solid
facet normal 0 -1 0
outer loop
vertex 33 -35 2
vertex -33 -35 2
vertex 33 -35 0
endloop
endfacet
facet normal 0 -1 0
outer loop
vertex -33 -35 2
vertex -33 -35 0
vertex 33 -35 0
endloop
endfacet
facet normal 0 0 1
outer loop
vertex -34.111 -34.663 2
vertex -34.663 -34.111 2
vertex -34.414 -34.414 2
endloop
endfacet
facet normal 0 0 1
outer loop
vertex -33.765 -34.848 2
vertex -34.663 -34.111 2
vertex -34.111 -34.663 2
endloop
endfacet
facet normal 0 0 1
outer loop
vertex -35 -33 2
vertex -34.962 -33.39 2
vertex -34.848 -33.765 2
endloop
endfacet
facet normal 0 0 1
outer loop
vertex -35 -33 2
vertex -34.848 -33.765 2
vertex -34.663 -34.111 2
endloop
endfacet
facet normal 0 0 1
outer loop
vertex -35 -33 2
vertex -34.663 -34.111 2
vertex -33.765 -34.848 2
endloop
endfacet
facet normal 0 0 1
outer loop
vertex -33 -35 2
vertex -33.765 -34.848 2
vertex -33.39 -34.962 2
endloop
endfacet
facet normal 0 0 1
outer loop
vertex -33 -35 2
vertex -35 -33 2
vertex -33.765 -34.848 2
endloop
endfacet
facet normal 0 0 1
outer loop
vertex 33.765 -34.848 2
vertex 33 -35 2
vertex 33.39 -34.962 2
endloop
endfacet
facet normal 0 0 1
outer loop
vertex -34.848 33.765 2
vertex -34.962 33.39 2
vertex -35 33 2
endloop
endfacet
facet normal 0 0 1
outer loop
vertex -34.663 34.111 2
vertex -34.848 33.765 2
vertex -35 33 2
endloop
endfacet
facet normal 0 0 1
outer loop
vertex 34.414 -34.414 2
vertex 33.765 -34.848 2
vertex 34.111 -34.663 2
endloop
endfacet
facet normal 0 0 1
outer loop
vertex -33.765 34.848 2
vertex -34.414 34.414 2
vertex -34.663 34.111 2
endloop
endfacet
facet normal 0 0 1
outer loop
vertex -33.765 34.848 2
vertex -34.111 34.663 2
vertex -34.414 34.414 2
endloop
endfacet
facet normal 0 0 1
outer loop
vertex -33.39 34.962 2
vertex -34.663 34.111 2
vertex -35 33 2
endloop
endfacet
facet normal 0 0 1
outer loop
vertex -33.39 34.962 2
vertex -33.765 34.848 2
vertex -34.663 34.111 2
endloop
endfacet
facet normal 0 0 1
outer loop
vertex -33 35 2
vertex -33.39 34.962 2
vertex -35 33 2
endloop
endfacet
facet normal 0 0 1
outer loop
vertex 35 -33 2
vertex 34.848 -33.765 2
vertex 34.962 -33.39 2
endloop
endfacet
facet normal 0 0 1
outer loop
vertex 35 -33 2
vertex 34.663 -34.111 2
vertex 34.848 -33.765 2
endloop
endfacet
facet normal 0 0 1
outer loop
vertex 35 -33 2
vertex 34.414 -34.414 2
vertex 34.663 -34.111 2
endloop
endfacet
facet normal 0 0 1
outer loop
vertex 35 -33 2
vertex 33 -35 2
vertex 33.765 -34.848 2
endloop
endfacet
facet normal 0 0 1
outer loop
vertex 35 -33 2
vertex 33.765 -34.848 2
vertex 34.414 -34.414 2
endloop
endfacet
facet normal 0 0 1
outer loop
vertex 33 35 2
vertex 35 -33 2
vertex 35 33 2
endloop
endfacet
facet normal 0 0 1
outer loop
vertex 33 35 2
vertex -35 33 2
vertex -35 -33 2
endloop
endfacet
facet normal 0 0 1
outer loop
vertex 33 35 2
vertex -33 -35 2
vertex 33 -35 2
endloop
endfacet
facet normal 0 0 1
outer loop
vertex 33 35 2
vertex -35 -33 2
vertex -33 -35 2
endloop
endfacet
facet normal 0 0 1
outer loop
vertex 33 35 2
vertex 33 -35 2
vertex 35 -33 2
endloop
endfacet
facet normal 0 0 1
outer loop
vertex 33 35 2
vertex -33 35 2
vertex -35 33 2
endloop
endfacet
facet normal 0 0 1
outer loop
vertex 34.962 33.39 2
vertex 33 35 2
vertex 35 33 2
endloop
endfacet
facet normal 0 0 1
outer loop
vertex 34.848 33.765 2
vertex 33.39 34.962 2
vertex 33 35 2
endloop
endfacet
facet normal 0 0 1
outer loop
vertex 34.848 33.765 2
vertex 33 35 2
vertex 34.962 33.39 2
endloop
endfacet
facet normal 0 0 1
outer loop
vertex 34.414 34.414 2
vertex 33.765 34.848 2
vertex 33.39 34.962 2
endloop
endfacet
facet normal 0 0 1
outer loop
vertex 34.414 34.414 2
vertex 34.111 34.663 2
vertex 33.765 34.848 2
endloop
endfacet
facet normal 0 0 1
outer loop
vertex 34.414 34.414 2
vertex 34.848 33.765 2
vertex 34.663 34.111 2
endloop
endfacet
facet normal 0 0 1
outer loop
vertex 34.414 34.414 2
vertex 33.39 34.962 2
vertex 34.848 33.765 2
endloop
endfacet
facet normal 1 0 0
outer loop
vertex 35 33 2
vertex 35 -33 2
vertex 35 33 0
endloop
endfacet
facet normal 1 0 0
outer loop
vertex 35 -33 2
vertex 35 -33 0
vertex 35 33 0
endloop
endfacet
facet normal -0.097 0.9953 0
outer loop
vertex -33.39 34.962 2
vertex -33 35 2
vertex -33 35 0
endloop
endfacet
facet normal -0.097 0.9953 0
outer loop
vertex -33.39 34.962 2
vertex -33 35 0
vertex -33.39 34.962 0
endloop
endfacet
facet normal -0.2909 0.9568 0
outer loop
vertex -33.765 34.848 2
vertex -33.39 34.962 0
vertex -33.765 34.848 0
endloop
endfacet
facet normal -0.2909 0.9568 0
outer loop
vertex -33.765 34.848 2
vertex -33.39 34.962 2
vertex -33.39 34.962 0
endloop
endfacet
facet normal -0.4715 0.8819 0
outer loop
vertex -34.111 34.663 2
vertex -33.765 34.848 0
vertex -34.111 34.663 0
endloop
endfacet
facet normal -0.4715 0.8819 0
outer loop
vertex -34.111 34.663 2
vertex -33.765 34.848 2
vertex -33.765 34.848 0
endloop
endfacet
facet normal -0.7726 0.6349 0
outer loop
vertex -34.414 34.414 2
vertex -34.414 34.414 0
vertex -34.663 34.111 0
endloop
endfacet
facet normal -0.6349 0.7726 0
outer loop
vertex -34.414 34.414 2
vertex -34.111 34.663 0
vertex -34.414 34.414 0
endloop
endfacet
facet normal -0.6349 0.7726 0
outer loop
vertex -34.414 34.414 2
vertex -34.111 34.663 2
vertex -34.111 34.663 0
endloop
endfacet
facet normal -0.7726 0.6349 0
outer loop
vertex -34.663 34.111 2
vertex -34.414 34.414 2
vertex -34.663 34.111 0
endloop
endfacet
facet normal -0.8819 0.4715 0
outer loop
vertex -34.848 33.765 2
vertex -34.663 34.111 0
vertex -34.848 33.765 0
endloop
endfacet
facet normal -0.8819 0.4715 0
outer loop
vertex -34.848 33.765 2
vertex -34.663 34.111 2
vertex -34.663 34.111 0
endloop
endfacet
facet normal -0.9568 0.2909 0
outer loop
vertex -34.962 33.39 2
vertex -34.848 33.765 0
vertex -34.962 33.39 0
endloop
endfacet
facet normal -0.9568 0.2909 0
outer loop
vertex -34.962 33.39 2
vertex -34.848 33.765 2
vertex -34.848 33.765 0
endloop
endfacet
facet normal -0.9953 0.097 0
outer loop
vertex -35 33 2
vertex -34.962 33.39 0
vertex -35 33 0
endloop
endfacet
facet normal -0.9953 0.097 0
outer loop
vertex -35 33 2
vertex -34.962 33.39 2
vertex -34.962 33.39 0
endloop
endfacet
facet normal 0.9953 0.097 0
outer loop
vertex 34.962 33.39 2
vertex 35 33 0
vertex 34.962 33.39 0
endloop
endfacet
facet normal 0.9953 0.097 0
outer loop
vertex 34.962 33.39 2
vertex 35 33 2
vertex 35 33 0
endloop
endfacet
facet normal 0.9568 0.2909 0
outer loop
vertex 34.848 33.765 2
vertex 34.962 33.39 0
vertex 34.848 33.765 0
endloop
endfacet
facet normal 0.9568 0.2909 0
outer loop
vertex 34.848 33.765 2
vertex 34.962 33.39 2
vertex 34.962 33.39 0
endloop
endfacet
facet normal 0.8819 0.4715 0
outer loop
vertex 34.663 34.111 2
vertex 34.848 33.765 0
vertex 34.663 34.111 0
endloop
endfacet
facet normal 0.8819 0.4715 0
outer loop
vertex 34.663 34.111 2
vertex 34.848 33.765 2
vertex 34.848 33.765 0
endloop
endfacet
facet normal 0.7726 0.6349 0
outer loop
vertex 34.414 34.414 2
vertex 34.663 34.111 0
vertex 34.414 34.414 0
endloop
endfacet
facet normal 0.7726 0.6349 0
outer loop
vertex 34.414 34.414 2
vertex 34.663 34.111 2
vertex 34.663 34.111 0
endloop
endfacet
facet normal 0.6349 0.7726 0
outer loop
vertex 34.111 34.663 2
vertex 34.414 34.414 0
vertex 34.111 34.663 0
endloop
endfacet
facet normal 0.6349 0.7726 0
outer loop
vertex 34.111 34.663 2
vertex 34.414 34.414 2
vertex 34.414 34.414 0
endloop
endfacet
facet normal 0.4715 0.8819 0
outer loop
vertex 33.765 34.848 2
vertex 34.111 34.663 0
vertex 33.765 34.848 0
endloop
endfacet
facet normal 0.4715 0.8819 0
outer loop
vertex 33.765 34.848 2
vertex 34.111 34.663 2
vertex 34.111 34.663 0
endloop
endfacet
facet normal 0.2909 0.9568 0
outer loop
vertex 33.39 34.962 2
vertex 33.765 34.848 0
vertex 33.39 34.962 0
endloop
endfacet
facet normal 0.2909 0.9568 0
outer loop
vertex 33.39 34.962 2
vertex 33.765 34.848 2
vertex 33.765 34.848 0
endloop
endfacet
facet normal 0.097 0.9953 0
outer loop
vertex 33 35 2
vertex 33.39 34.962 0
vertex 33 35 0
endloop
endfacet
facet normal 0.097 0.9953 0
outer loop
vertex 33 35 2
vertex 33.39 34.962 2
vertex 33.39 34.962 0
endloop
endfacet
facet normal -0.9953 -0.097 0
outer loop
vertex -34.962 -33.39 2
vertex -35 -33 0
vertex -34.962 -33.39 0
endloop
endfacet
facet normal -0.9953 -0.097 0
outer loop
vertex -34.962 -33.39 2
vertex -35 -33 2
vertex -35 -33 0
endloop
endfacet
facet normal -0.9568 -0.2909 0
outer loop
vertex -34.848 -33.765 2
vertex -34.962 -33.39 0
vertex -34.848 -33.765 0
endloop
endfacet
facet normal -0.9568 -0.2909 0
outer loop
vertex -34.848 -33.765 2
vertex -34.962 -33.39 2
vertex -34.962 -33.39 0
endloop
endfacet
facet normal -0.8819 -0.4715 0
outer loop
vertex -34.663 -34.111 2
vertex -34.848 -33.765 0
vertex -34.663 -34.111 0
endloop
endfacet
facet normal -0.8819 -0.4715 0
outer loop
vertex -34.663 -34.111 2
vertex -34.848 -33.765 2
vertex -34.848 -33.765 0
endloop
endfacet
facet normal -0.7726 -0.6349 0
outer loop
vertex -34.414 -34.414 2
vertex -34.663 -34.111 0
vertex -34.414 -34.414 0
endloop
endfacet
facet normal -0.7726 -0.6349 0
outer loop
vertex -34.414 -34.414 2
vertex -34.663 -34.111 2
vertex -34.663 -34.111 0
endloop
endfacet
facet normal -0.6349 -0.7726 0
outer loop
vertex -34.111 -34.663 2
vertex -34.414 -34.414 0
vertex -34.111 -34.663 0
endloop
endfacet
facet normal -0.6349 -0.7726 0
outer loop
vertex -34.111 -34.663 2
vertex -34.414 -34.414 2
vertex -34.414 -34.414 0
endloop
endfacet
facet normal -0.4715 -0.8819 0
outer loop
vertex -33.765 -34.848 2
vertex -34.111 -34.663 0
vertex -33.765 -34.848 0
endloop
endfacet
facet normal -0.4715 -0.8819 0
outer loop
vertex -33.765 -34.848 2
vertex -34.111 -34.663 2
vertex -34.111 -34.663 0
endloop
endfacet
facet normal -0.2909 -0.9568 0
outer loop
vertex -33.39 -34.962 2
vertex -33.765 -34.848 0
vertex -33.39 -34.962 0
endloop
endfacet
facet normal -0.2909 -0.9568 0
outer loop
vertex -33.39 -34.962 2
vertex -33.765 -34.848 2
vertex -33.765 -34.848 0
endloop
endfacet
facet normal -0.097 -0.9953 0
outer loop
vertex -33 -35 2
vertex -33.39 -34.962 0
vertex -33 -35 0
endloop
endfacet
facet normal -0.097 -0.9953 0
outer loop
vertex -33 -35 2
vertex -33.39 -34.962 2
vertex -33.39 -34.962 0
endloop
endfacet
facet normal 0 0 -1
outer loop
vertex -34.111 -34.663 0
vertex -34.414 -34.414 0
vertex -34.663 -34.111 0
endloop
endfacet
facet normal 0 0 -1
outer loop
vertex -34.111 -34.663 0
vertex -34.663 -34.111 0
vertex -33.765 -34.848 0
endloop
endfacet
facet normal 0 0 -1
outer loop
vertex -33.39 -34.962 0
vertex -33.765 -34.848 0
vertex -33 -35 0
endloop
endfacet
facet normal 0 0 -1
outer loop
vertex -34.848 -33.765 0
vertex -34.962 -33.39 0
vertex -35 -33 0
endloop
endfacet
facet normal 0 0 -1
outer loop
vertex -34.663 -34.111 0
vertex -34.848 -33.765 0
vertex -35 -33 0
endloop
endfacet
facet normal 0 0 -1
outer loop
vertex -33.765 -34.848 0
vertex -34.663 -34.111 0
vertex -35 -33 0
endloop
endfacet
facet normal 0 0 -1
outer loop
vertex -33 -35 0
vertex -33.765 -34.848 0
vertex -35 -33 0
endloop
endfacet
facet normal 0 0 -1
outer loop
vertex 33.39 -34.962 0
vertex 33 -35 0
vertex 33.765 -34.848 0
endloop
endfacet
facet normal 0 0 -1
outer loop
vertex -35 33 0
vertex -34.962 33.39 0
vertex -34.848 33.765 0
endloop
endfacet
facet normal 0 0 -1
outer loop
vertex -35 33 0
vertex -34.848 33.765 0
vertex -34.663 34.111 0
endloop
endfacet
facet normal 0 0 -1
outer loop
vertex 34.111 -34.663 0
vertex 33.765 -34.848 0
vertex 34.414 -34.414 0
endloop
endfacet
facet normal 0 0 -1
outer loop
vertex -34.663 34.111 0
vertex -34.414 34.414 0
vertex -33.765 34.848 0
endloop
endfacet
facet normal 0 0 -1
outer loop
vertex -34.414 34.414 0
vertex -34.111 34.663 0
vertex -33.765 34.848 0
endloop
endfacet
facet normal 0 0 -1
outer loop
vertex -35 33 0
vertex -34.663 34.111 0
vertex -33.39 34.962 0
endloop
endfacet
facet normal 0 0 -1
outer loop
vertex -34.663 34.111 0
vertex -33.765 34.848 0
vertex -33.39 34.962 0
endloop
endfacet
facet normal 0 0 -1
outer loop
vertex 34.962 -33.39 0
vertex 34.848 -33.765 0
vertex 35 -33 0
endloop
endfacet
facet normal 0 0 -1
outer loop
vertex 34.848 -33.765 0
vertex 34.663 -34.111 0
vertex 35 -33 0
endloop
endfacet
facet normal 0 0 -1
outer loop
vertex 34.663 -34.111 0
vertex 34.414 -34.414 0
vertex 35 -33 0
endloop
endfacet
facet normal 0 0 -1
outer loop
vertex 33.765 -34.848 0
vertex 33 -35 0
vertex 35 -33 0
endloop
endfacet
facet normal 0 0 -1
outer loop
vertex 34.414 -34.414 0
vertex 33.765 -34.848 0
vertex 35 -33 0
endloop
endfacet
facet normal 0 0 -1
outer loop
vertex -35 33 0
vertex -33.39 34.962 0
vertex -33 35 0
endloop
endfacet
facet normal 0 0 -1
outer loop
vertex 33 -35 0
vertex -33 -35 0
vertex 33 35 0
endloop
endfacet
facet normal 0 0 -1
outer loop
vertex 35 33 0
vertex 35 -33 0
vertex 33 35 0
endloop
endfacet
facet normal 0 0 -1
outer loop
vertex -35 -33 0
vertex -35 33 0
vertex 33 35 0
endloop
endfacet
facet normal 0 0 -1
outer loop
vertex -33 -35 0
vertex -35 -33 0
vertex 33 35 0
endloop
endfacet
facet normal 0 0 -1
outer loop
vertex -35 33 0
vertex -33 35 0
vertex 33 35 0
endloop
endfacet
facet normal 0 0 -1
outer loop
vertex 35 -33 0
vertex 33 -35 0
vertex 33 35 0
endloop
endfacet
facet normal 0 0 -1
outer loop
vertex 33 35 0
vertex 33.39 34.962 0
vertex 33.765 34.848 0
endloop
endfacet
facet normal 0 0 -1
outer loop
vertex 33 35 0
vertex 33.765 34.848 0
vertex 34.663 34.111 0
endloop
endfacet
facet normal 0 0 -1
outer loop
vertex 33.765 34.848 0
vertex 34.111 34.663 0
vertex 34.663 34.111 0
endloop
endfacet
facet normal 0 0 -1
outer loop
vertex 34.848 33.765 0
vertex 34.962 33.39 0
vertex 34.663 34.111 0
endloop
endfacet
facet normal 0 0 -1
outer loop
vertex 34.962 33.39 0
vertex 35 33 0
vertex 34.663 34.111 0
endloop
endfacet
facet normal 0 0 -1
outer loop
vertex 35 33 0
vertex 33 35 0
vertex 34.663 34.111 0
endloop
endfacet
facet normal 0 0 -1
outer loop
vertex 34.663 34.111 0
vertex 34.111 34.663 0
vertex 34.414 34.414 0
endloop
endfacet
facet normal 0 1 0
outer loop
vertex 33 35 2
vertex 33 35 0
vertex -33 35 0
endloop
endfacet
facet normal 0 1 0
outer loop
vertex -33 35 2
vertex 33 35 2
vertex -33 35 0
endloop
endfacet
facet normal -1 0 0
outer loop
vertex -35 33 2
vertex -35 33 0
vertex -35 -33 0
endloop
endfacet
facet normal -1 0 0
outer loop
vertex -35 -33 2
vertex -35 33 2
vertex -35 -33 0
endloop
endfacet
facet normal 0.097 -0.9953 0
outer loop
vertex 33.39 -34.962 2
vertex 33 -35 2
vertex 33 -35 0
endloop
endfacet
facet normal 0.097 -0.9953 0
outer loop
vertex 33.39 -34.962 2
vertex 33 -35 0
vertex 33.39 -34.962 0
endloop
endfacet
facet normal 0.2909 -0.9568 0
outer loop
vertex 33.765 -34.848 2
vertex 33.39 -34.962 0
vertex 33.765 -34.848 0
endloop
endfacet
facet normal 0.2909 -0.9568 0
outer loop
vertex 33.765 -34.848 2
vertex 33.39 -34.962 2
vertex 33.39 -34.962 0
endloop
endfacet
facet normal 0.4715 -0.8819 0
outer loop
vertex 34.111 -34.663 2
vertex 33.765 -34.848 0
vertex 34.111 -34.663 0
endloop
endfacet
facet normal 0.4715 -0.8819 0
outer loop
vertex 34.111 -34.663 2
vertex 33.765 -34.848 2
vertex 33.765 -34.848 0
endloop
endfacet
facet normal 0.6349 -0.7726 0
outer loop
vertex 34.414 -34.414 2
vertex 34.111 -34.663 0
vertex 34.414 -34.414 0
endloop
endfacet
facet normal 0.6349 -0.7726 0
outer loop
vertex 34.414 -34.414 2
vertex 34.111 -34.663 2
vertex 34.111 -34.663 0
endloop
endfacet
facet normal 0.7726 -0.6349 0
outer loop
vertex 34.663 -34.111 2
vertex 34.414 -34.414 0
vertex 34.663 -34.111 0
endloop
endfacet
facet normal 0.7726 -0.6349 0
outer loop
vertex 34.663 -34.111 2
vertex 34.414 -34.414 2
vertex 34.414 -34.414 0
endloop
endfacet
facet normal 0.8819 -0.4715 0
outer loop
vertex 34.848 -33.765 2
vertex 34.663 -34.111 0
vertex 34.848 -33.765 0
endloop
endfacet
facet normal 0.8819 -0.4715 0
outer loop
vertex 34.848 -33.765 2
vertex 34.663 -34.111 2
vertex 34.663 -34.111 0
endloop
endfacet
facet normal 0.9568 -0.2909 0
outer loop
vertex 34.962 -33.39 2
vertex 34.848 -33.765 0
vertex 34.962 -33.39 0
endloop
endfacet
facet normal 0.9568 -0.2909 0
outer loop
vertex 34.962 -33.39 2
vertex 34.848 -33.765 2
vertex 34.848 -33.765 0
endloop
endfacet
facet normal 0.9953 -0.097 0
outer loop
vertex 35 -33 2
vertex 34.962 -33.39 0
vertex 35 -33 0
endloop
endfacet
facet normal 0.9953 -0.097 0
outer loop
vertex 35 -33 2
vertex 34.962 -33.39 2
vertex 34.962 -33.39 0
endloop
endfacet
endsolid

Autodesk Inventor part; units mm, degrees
ref_plane "YZ Plane" through (0, 0, 0) normal (1, 0, 0) x (0, 1, 0)
ref_plane "XZ Plane" through (0, 0, 0) normal (0, 1, 0) x (-1, 0, 0)
ref_plane "XY Plane" through (0, 0, 0) normal (0, 0, 1) x (1, 0, 0)
sketch "Sketch1" plane through (0, 0, 0) normal (0, 0, 1) x (1, 0, 0)
  line L0 (-35, -35) -> (35, -35)
  line L1 (35, -35) -> (35, 35)
  line L2 (35, 35) -> (-35, 35)
  line L3 (-35, 35) -> (-35, -35)
  line L4 (-35, -35) -> (35, 35) construction
  line L5 (35, -35) -> (-35, 35) construction
  point P0 (0, 0)
  dimension "d154" = 70
  dimension "d155" = 70
extrude "Plate5" add sketch "Sketch1" along normal blind 2
fillet "Corner Round1" radius 2 4 edges at (35, 35, 1) (-35, -35, 1) (-35, 35, 1) (35, -35, 1)
sketch "Sketch11" plane through (-50.5, -22, -28) normal (1, 0, 0) x (0, 0, -1)
  line L0 (-25.25, 44) -> (-25.25, 0) construction
  line L1 (0, 0) -> (-25.25, 0) construction
  line L2 (0, 0) -> (0, 44) construction
  line L3 (0, 44) -> (-25.25, 44) construction
  circle A0 centre (-10, 22) radius 5.5
  point P0 (-28, 22)
  point P1 (0, 22)
  dimension "d192" = 11
  dimension "d193" = 10
cut "Cut3" [suppressed]
feature "Corner Round3" [suppressed]
sketch "Sketch10" plane through (-37, 33, 2) normal (1, 0, 0) x (0, 1, 0)
  line L0 (-66, 0) -> (0, 0)
  line L1 (0, 0) -> (0, -30)
  line L2 (0, -30) -> (-66, -30)
  line L3 (-66, -30) -> (-66, 0)
properties part number "PRS 1424 DrSysB diam way cup_D1200" material "Stainless Steel"
